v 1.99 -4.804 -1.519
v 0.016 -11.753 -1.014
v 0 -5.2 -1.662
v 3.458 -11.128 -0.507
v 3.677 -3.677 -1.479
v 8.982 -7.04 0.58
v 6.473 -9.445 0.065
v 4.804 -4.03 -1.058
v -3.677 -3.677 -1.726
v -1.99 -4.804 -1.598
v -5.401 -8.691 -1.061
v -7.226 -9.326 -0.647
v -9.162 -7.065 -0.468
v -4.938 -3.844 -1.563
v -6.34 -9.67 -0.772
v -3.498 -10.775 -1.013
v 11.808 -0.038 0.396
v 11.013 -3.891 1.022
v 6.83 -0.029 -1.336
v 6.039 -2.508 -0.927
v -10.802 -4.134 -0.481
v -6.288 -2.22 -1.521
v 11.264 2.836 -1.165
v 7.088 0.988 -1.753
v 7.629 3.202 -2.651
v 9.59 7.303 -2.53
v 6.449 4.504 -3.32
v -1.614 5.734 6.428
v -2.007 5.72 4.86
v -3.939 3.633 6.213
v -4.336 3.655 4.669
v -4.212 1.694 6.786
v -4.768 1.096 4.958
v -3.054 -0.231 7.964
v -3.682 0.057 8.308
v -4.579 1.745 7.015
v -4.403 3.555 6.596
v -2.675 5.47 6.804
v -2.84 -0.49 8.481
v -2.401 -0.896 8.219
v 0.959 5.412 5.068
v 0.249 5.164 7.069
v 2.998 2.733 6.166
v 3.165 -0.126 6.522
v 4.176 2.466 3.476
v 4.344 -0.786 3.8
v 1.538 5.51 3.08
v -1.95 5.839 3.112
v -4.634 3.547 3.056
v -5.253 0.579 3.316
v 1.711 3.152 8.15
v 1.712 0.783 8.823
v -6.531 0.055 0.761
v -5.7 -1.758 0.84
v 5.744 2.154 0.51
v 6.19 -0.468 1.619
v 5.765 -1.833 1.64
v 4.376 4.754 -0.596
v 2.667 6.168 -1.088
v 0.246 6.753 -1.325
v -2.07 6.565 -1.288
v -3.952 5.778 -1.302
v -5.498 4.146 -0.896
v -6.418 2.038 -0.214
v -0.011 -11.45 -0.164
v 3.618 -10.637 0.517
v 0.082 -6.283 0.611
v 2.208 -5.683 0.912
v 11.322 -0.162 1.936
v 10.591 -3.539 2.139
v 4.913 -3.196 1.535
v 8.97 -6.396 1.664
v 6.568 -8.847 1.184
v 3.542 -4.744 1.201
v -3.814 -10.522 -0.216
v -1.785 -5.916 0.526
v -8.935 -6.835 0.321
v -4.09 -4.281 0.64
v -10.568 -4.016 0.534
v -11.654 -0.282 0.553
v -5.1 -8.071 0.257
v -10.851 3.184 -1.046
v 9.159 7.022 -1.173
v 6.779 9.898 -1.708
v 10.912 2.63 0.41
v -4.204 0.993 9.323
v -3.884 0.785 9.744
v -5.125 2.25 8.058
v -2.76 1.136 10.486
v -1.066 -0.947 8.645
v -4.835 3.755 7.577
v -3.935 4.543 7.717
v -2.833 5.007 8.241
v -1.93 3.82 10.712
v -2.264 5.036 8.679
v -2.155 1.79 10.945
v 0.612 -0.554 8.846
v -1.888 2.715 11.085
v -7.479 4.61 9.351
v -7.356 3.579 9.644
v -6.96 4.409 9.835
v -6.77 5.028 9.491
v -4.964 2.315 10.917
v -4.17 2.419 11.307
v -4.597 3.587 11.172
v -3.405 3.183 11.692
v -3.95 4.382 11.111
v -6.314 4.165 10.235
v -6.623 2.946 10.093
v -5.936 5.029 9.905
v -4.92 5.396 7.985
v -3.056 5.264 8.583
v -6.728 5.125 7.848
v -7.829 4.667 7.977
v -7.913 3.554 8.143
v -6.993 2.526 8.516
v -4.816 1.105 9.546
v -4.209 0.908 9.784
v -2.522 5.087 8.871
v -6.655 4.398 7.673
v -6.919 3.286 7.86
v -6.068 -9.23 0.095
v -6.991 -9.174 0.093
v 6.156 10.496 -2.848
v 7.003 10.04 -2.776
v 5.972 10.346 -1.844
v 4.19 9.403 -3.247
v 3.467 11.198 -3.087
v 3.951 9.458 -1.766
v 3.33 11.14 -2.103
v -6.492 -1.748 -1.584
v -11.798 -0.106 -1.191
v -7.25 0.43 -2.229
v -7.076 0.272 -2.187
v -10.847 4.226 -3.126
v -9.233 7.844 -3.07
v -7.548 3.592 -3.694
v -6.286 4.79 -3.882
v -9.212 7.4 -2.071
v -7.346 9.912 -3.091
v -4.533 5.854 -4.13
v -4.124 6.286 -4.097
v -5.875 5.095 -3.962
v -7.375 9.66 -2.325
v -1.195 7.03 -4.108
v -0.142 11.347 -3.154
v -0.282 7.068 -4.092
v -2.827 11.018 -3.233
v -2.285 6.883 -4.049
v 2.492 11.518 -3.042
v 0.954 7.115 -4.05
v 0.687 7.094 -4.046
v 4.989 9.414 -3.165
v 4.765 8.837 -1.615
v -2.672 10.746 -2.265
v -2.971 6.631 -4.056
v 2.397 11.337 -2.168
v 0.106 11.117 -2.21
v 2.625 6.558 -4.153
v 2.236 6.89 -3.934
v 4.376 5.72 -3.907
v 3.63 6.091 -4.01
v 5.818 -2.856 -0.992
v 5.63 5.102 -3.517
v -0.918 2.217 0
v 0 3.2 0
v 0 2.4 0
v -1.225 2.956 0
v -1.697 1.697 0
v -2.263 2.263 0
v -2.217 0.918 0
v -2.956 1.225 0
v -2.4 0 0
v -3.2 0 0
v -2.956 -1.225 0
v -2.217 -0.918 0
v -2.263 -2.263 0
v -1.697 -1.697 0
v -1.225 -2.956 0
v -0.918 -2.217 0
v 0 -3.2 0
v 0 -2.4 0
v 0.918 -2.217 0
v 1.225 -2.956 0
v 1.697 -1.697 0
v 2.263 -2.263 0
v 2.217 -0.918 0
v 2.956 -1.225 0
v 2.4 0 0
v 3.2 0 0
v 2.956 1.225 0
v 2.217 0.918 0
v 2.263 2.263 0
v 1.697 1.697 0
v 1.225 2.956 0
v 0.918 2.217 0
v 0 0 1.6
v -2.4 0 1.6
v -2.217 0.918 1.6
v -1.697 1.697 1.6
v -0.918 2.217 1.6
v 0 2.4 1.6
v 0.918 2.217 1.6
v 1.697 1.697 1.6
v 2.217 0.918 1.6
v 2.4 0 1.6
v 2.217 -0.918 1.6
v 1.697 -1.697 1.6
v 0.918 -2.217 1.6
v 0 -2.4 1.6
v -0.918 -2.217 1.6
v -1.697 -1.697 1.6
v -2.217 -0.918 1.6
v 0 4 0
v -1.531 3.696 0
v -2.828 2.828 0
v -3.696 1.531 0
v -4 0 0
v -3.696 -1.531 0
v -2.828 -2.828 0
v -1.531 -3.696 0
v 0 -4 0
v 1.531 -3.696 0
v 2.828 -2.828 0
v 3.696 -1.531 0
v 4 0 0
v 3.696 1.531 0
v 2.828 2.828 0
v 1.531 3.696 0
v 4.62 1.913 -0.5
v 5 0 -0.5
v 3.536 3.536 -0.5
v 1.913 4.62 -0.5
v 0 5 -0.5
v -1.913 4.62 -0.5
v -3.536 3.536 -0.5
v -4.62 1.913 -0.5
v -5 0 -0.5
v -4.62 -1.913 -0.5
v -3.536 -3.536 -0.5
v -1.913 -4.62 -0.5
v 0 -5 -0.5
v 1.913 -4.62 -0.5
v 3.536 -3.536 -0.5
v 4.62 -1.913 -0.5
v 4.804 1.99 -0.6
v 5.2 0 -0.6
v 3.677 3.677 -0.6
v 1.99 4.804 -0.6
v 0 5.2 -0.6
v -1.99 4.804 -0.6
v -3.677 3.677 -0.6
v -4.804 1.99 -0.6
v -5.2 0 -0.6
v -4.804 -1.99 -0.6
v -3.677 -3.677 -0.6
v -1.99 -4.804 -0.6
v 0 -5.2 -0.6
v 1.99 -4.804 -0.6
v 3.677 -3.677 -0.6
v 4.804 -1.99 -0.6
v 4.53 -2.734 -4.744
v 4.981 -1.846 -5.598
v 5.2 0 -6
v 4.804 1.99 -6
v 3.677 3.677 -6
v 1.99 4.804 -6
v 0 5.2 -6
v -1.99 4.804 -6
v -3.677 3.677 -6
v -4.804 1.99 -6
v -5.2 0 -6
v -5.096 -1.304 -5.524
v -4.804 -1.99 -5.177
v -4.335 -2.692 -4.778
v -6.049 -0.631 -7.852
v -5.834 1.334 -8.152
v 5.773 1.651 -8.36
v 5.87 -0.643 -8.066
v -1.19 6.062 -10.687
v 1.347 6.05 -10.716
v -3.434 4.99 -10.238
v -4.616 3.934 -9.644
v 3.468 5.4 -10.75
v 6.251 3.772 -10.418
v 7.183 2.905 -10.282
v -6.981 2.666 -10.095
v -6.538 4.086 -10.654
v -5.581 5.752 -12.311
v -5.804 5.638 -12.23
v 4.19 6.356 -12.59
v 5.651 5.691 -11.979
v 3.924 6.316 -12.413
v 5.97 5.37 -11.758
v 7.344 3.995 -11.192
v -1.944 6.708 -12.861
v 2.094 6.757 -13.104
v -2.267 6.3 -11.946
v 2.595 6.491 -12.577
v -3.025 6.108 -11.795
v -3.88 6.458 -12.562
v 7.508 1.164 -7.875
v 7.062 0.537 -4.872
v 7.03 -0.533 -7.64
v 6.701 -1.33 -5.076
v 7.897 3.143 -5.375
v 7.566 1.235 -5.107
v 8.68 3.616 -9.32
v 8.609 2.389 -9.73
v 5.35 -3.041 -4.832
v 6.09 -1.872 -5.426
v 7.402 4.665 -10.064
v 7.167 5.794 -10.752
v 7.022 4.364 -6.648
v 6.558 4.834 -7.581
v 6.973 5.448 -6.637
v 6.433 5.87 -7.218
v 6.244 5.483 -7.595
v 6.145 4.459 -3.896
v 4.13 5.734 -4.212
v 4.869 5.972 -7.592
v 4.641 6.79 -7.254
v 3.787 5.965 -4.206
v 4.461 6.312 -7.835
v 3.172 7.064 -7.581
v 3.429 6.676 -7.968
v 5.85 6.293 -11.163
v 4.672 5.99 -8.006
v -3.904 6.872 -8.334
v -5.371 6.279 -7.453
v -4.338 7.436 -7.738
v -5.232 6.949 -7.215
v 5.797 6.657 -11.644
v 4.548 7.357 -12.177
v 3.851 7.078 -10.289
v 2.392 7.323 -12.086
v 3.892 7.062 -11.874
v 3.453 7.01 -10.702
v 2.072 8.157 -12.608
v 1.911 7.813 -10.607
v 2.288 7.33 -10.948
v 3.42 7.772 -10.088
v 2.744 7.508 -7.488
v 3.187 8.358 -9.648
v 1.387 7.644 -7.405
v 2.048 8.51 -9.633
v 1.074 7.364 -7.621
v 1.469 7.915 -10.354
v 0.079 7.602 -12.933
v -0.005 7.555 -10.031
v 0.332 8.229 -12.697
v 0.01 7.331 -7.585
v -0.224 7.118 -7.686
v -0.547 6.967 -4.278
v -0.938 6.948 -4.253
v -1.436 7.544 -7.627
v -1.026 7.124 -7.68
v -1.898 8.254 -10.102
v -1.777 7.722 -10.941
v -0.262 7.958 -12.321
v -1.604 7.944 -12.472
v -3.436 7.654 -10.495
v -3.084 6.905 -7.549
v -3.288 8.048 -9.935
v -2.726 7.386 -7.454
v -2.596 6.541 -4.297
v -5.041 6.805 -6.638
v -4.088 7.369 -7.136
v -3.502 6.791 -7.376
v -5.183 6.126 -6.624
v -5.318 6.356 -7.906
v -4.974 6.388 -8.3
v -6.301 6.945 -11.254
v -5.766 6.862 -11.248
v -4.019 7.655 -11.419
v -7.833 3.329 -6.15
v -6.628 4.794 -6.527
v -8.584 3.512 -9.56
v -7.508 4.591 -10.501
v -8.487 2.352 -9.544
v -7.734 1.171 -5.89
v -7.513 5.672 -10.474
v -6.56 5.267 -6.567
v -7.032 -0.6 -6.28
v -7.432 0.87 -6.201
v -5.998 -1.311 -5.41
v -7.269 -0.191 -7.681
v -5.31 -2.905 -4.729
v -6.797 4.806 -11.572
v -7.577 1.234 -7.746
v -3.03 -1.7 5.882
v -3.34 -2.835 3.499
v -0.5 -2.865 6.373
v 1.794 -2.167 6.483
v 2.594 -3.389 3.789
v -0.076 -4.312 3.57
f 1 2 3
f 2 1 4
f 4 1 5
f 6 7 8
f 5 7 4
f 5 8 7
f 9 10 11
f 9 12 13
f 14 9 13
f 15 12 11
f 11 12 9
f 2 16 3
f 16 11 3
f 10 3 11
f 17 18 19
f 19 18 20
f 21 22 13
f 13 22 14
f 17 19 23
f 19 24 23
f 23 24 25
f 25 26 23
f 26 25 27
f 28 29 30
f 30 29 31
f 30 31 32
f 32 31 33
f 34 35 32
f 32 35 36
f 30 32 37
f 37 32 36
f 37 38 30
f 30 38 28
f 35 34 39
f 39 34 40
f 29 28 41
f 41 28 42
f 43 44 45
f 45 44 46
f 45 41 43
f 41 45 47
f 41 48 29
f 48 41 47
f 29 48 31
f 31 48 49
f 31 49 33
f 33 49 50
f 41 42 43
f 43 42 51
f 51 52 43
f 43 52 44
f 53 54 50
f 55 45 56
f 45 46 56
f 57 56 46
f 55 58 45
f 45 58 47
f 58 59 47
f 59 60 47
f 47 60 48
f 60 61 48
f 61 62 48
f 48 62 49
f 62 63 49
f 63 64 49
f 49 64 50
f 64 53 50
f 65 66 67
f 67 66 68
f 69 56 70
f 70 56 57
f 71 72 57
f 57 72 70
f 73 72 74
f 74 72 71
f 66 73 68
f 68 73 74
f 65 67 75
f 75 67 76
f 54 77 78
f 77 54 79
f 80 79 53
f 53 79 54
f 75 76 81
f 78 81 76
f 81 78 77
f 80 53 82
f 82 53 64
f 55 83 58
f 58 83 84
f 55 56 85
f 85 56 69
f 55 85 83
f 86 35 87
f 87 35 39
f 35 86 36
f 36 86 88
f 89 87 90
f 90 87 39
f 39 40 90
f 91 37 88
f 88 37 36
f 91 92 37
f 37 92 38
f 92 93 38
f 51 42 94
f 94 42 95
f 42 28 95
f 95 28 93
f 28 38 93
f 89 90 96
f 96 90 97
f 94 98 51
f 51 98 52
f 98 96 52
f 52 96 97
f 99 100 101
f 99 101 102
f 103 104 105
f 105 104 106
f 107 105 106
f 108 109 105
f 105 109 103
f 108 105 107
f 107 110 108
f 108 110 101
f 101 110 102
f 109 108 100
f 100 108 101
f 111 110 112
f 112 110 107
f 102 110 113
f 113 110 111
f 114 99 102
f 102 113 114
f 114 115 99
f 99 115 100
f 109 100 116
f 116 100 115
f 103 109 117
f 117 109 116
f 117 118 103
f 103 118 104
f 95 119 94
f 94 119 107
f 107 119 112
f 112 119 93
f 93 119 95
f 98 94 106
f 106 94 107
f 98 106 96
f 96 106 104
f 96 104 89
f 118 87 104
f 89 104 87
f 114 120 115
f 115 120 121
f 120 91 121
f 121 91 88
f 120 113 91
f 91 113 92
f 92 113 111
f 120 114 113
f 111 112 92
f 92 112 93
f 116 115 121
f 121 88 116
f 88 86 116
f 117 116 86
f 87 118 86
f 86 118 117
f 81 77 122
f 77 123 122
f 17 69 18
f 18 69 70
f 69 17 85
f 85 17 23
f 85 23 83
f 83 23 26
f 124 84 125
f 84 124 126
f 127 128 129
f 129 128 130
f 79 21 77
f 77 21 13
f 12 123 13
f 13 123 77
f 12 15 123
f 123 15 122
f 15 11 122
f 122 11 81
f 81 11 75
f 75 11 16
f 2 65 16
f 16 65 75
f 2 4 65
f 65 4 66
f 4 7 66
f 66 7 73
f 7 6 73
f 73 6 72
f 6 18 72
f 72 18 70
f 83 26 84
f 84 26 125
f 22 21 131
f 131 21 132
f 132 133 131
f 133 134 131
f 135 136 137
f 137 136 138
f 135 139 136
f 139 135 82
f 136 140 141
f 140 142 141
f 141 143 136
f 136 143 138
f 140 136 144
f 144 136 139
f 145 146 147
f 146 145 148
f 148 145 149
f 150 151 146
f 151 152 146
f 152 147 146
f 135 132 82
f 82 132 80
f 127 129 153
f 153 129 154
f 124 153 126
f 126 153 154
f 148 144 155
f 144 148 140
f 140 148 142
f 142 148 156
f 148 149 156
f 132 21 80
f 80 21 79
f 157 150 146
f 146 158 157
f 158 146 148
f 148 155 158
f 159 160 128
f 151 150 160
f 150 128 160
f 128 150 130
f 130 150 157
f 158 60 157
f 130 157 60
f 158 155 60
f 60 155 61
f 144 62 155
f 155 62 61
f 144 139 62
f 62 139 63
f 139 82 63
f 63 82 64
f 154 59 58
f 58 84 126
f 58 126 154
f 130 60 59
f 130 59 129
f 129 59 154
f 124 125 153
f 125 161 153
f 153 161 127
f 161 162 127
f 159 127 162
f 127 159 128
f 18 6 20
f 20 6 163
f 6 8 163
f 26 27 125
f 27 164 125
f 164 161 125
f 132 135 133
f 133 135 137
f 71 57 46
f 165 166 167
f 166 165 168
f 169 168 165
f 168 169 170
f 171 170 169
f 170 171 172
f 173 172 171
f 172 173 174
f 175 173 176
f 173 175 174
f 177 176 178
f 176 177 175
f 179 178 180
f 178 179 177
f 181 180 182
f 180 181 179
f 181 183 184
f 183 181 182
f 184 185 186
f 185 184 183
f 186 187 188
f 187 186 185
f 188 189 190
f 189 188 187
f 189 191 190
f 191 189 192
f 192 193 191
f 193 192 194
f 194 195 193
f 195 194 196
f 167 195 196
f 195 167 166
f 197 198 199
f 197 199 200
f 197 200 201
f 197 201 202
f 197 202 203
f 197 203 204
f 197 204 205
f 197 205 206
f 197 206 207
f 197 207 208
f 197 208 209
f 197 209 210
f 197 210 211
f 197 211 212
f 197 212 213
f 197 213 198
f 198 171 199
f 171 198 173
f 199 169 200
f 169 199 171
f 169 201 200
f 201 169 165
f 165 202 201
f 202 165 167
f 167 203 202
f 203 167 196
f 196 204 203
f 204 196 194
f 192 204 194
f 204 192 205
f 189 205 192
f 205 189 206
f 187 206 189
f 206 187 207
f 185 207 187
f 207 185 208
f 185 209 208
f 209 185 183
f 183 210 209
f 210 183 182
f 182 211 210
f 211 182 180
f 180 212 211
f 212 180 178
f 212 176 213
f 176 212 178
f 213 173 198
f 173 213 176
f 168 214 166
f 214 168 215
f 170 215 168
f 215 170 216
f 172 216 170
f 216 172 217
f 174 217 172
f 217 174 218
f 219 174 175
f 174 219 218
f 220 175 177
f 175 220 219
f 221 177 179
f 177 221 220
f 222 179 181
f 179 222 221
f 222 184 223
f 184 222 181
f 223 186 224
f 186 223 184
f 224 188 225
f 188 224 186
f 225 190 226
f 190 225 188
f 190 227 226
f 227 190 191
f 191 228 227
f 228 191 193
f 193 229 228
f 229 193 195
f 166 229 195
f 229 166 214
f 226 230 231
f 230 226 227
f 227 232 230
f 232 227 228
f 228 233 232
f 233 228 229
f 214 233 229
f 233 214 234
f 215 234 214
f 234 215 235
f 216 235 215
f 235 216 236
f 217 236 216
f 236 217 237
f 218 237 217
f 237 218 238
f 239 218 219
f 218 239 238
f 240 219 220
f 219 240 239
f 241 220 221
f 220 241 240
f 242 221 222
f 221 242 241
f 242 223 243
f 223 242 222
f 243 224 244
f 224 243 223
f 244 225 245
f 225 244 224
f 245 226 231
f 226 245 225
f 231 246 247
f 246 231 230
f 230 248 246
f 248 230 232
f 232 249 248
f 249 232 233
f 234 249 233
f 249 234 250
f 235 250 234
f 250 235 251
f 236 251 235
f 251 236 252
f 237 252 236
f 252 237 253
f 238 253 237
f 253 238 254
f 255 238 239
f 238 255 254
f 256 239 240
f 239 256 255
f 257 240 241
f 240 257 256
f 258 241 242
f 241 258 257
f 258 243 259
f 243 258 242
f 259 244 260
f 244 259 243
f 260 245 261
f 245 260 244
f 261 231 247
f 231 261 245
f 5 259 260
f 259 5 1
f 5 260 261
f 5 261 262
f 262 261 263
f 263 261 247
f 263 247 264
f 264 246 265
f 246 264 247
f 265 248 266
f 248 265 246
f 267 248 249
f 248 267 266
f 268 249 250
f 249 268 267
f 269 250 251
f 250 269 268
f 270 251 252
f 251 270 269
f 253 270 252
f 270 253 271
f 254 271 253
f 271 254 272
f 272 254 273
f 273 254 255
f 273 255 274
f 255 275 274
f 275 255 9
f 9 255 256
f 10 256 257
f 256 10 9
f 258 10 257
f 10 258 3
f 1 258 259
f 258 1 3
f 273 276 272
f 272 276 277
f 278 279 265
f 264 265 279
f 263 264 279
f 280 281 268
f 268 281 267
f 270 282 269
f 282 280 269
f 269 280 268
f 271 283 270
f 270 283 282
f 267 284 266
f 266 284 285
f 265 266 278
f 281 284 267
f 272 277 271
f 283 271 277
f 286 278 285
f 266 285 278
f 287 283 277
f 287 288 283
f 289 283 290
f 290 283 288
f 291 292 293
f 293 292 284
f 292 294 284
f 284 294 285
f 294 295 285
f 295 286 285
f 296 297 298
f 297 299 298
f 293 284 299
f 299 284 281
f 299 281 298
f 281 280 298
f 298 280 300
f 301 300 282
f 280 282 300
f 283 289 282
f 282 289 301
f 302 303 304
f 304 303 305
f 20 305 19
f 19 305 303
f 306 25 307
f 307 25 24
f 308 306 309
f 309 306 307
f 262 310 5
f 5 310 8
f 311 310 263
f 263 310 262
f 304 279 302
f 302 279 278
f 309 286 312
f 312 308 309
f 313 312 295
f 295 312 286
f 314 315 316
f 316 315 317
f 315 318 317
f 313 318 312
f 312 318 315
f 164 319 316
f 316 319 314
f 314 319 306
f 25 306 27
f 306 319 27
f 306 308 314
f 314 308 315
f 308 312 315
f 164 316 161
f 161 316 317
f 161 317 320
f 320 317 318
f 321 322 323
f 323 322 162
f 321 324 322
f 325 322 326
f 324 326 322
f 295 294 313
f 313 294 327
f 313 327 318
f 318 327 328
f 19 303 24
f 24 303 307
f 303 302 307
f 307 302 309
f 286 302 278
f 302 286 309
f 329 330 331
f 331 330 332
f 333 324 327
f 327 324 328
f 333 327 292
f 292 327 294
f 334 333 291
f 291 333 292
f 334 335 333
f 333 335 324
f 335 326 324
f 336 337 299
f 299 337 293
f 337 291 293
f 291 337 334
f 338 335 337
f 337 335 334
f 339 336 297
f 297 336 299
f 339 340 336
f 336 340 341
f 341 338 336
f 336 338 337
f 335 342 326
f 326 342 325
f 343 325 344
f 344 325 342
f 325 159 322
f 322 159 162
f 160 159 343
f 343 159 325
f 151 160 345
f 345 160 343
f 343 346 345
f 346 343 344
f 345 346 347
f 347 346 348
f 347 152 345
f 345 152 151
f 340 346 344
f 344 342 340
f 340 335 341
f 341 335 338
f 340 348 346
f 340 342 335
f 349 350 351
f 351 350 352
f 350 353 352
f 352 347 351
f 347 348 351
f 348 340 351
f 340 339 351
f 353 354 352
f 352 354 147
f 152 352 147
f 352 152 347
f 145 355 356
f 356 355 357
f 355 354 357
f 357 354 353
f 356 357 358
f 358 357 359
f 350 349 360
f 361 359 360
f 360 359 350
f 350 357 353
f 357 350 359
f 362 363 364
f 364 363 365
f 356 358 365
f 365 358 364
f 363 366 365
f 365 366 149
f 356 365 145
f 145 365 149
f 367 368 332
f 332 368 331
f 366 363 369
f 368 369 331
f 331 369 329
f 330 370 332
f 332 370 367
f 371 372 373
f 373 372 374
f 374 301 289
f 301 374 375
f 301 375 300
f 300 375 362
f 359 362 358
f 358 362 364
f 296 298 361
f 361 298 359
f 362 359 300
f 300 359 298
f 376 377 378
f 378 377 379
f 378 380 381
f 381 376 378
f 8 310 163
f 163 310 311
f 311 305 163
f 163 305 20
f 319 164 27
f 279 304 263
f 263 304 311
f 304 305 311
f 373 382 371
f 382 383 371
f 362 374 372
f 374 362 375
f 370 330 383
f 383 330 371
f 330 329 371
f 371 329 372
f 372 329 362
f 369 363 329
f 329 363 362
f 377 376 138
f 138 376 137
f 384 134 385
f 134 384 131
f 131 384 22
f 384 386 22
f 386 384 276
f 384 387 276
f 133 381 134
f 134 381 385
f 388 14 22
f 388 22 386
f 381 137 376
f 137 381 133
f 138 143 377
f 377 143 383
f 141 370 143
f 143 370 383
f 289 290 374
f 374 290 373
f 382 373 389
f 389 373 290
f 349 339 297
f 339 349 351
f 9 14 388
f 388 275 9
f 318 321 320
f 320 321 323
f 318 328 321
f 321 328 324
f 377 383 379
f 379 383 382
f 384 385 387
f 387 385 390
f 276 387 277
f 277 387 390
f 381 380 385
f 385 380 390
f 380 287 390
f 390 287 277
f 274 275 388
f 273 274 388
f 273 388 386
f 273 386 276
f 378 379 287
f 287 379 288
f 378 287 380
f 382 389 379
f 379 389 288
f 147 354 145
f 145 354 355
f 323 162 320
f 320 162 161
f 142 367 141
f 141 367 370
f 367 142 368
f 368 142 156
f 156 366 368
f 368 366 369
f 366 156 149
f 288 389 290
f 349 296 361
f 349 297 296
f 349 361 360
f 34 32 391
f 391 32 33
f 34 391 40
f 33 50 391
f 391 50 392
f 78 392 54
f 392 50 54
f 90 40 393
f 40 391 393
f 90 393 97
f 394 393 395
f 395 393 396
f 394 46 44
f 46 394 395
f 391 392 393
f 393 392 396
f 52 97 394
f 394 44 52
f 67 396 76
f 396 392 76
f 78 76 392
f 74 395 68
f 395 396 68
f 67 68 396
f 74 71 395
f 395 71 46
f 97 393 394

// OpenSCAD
use <../lib.scad>
use <s/20606s01.scad>
use <s/20606s02.scad>
use <s/20606s03.scad>
function ldraw_lib__20606p02() = [
// 0 Minifig Hair Mid-Length Scraggly with Dual Mould Dark Orange Floppy Witch Hat
// 0 Name: 20606p02.dat
// 0 Author: Lisa Winter [LisaWinter]
// 0 !LDRAW_ORG Part UPDATE 2026-07
// 0 !LICENSE Licensed under CC BY 4.0 : see CAreadme.txt
// 
// 0 BFC CERTIFY CCW
  [0,"BFC","CERTIFY"],
  [0,"BFC","CCW"],
// 
// 0 !CATEGORY Minifig Headwear
// 0 !KEYWORDS Bricklink 20606pb02, Colour Combination, Harry Potter
// 0 !KEYWORDS Professor Vector, Rebrickable 20606pr0007, Set 76435
// 
// 0 !HISTORY 2026-07-30 [OrionP] Official Update 2026-07
// 
// 0 // Hat
// 1 484 0 0 0 1 0 0 0 1 0 0 0 1 s\20606s01.dat
  [1,484,0,0,0,1,0,0,0,1,0,0,0,1, ldraw_lib__s__20606s01()],
// 0 // Hair
// 1 16 0 0 0 1 0 0 0 1 0 0 0 1 s\20606s02.dat
  [1,16,0,0,0,1,0,0,0,1,0,0,0,1, ldraw_lib__s__20606s02()],
// 0 // Patternable area
// 1 484 0 0 0 1 0 0 0 1 0 0 0 1 s\20606s03.dat
  [1,484,0,0,0,1,0,0,0,1,0,0,0,1, ldraw_lib__s__20606s03()],
];
module ldraw_lib__20606p02(step=0, col=false, unit=2/5, alt=false, line=0.2, solid=!$preview)
    makepoly(ldraw_lib__20606p02(), step=step, col=col, unit=unit, alt=alt, line=line, solid=solid);
ldraw_lib__20606p02(line=0.2);
